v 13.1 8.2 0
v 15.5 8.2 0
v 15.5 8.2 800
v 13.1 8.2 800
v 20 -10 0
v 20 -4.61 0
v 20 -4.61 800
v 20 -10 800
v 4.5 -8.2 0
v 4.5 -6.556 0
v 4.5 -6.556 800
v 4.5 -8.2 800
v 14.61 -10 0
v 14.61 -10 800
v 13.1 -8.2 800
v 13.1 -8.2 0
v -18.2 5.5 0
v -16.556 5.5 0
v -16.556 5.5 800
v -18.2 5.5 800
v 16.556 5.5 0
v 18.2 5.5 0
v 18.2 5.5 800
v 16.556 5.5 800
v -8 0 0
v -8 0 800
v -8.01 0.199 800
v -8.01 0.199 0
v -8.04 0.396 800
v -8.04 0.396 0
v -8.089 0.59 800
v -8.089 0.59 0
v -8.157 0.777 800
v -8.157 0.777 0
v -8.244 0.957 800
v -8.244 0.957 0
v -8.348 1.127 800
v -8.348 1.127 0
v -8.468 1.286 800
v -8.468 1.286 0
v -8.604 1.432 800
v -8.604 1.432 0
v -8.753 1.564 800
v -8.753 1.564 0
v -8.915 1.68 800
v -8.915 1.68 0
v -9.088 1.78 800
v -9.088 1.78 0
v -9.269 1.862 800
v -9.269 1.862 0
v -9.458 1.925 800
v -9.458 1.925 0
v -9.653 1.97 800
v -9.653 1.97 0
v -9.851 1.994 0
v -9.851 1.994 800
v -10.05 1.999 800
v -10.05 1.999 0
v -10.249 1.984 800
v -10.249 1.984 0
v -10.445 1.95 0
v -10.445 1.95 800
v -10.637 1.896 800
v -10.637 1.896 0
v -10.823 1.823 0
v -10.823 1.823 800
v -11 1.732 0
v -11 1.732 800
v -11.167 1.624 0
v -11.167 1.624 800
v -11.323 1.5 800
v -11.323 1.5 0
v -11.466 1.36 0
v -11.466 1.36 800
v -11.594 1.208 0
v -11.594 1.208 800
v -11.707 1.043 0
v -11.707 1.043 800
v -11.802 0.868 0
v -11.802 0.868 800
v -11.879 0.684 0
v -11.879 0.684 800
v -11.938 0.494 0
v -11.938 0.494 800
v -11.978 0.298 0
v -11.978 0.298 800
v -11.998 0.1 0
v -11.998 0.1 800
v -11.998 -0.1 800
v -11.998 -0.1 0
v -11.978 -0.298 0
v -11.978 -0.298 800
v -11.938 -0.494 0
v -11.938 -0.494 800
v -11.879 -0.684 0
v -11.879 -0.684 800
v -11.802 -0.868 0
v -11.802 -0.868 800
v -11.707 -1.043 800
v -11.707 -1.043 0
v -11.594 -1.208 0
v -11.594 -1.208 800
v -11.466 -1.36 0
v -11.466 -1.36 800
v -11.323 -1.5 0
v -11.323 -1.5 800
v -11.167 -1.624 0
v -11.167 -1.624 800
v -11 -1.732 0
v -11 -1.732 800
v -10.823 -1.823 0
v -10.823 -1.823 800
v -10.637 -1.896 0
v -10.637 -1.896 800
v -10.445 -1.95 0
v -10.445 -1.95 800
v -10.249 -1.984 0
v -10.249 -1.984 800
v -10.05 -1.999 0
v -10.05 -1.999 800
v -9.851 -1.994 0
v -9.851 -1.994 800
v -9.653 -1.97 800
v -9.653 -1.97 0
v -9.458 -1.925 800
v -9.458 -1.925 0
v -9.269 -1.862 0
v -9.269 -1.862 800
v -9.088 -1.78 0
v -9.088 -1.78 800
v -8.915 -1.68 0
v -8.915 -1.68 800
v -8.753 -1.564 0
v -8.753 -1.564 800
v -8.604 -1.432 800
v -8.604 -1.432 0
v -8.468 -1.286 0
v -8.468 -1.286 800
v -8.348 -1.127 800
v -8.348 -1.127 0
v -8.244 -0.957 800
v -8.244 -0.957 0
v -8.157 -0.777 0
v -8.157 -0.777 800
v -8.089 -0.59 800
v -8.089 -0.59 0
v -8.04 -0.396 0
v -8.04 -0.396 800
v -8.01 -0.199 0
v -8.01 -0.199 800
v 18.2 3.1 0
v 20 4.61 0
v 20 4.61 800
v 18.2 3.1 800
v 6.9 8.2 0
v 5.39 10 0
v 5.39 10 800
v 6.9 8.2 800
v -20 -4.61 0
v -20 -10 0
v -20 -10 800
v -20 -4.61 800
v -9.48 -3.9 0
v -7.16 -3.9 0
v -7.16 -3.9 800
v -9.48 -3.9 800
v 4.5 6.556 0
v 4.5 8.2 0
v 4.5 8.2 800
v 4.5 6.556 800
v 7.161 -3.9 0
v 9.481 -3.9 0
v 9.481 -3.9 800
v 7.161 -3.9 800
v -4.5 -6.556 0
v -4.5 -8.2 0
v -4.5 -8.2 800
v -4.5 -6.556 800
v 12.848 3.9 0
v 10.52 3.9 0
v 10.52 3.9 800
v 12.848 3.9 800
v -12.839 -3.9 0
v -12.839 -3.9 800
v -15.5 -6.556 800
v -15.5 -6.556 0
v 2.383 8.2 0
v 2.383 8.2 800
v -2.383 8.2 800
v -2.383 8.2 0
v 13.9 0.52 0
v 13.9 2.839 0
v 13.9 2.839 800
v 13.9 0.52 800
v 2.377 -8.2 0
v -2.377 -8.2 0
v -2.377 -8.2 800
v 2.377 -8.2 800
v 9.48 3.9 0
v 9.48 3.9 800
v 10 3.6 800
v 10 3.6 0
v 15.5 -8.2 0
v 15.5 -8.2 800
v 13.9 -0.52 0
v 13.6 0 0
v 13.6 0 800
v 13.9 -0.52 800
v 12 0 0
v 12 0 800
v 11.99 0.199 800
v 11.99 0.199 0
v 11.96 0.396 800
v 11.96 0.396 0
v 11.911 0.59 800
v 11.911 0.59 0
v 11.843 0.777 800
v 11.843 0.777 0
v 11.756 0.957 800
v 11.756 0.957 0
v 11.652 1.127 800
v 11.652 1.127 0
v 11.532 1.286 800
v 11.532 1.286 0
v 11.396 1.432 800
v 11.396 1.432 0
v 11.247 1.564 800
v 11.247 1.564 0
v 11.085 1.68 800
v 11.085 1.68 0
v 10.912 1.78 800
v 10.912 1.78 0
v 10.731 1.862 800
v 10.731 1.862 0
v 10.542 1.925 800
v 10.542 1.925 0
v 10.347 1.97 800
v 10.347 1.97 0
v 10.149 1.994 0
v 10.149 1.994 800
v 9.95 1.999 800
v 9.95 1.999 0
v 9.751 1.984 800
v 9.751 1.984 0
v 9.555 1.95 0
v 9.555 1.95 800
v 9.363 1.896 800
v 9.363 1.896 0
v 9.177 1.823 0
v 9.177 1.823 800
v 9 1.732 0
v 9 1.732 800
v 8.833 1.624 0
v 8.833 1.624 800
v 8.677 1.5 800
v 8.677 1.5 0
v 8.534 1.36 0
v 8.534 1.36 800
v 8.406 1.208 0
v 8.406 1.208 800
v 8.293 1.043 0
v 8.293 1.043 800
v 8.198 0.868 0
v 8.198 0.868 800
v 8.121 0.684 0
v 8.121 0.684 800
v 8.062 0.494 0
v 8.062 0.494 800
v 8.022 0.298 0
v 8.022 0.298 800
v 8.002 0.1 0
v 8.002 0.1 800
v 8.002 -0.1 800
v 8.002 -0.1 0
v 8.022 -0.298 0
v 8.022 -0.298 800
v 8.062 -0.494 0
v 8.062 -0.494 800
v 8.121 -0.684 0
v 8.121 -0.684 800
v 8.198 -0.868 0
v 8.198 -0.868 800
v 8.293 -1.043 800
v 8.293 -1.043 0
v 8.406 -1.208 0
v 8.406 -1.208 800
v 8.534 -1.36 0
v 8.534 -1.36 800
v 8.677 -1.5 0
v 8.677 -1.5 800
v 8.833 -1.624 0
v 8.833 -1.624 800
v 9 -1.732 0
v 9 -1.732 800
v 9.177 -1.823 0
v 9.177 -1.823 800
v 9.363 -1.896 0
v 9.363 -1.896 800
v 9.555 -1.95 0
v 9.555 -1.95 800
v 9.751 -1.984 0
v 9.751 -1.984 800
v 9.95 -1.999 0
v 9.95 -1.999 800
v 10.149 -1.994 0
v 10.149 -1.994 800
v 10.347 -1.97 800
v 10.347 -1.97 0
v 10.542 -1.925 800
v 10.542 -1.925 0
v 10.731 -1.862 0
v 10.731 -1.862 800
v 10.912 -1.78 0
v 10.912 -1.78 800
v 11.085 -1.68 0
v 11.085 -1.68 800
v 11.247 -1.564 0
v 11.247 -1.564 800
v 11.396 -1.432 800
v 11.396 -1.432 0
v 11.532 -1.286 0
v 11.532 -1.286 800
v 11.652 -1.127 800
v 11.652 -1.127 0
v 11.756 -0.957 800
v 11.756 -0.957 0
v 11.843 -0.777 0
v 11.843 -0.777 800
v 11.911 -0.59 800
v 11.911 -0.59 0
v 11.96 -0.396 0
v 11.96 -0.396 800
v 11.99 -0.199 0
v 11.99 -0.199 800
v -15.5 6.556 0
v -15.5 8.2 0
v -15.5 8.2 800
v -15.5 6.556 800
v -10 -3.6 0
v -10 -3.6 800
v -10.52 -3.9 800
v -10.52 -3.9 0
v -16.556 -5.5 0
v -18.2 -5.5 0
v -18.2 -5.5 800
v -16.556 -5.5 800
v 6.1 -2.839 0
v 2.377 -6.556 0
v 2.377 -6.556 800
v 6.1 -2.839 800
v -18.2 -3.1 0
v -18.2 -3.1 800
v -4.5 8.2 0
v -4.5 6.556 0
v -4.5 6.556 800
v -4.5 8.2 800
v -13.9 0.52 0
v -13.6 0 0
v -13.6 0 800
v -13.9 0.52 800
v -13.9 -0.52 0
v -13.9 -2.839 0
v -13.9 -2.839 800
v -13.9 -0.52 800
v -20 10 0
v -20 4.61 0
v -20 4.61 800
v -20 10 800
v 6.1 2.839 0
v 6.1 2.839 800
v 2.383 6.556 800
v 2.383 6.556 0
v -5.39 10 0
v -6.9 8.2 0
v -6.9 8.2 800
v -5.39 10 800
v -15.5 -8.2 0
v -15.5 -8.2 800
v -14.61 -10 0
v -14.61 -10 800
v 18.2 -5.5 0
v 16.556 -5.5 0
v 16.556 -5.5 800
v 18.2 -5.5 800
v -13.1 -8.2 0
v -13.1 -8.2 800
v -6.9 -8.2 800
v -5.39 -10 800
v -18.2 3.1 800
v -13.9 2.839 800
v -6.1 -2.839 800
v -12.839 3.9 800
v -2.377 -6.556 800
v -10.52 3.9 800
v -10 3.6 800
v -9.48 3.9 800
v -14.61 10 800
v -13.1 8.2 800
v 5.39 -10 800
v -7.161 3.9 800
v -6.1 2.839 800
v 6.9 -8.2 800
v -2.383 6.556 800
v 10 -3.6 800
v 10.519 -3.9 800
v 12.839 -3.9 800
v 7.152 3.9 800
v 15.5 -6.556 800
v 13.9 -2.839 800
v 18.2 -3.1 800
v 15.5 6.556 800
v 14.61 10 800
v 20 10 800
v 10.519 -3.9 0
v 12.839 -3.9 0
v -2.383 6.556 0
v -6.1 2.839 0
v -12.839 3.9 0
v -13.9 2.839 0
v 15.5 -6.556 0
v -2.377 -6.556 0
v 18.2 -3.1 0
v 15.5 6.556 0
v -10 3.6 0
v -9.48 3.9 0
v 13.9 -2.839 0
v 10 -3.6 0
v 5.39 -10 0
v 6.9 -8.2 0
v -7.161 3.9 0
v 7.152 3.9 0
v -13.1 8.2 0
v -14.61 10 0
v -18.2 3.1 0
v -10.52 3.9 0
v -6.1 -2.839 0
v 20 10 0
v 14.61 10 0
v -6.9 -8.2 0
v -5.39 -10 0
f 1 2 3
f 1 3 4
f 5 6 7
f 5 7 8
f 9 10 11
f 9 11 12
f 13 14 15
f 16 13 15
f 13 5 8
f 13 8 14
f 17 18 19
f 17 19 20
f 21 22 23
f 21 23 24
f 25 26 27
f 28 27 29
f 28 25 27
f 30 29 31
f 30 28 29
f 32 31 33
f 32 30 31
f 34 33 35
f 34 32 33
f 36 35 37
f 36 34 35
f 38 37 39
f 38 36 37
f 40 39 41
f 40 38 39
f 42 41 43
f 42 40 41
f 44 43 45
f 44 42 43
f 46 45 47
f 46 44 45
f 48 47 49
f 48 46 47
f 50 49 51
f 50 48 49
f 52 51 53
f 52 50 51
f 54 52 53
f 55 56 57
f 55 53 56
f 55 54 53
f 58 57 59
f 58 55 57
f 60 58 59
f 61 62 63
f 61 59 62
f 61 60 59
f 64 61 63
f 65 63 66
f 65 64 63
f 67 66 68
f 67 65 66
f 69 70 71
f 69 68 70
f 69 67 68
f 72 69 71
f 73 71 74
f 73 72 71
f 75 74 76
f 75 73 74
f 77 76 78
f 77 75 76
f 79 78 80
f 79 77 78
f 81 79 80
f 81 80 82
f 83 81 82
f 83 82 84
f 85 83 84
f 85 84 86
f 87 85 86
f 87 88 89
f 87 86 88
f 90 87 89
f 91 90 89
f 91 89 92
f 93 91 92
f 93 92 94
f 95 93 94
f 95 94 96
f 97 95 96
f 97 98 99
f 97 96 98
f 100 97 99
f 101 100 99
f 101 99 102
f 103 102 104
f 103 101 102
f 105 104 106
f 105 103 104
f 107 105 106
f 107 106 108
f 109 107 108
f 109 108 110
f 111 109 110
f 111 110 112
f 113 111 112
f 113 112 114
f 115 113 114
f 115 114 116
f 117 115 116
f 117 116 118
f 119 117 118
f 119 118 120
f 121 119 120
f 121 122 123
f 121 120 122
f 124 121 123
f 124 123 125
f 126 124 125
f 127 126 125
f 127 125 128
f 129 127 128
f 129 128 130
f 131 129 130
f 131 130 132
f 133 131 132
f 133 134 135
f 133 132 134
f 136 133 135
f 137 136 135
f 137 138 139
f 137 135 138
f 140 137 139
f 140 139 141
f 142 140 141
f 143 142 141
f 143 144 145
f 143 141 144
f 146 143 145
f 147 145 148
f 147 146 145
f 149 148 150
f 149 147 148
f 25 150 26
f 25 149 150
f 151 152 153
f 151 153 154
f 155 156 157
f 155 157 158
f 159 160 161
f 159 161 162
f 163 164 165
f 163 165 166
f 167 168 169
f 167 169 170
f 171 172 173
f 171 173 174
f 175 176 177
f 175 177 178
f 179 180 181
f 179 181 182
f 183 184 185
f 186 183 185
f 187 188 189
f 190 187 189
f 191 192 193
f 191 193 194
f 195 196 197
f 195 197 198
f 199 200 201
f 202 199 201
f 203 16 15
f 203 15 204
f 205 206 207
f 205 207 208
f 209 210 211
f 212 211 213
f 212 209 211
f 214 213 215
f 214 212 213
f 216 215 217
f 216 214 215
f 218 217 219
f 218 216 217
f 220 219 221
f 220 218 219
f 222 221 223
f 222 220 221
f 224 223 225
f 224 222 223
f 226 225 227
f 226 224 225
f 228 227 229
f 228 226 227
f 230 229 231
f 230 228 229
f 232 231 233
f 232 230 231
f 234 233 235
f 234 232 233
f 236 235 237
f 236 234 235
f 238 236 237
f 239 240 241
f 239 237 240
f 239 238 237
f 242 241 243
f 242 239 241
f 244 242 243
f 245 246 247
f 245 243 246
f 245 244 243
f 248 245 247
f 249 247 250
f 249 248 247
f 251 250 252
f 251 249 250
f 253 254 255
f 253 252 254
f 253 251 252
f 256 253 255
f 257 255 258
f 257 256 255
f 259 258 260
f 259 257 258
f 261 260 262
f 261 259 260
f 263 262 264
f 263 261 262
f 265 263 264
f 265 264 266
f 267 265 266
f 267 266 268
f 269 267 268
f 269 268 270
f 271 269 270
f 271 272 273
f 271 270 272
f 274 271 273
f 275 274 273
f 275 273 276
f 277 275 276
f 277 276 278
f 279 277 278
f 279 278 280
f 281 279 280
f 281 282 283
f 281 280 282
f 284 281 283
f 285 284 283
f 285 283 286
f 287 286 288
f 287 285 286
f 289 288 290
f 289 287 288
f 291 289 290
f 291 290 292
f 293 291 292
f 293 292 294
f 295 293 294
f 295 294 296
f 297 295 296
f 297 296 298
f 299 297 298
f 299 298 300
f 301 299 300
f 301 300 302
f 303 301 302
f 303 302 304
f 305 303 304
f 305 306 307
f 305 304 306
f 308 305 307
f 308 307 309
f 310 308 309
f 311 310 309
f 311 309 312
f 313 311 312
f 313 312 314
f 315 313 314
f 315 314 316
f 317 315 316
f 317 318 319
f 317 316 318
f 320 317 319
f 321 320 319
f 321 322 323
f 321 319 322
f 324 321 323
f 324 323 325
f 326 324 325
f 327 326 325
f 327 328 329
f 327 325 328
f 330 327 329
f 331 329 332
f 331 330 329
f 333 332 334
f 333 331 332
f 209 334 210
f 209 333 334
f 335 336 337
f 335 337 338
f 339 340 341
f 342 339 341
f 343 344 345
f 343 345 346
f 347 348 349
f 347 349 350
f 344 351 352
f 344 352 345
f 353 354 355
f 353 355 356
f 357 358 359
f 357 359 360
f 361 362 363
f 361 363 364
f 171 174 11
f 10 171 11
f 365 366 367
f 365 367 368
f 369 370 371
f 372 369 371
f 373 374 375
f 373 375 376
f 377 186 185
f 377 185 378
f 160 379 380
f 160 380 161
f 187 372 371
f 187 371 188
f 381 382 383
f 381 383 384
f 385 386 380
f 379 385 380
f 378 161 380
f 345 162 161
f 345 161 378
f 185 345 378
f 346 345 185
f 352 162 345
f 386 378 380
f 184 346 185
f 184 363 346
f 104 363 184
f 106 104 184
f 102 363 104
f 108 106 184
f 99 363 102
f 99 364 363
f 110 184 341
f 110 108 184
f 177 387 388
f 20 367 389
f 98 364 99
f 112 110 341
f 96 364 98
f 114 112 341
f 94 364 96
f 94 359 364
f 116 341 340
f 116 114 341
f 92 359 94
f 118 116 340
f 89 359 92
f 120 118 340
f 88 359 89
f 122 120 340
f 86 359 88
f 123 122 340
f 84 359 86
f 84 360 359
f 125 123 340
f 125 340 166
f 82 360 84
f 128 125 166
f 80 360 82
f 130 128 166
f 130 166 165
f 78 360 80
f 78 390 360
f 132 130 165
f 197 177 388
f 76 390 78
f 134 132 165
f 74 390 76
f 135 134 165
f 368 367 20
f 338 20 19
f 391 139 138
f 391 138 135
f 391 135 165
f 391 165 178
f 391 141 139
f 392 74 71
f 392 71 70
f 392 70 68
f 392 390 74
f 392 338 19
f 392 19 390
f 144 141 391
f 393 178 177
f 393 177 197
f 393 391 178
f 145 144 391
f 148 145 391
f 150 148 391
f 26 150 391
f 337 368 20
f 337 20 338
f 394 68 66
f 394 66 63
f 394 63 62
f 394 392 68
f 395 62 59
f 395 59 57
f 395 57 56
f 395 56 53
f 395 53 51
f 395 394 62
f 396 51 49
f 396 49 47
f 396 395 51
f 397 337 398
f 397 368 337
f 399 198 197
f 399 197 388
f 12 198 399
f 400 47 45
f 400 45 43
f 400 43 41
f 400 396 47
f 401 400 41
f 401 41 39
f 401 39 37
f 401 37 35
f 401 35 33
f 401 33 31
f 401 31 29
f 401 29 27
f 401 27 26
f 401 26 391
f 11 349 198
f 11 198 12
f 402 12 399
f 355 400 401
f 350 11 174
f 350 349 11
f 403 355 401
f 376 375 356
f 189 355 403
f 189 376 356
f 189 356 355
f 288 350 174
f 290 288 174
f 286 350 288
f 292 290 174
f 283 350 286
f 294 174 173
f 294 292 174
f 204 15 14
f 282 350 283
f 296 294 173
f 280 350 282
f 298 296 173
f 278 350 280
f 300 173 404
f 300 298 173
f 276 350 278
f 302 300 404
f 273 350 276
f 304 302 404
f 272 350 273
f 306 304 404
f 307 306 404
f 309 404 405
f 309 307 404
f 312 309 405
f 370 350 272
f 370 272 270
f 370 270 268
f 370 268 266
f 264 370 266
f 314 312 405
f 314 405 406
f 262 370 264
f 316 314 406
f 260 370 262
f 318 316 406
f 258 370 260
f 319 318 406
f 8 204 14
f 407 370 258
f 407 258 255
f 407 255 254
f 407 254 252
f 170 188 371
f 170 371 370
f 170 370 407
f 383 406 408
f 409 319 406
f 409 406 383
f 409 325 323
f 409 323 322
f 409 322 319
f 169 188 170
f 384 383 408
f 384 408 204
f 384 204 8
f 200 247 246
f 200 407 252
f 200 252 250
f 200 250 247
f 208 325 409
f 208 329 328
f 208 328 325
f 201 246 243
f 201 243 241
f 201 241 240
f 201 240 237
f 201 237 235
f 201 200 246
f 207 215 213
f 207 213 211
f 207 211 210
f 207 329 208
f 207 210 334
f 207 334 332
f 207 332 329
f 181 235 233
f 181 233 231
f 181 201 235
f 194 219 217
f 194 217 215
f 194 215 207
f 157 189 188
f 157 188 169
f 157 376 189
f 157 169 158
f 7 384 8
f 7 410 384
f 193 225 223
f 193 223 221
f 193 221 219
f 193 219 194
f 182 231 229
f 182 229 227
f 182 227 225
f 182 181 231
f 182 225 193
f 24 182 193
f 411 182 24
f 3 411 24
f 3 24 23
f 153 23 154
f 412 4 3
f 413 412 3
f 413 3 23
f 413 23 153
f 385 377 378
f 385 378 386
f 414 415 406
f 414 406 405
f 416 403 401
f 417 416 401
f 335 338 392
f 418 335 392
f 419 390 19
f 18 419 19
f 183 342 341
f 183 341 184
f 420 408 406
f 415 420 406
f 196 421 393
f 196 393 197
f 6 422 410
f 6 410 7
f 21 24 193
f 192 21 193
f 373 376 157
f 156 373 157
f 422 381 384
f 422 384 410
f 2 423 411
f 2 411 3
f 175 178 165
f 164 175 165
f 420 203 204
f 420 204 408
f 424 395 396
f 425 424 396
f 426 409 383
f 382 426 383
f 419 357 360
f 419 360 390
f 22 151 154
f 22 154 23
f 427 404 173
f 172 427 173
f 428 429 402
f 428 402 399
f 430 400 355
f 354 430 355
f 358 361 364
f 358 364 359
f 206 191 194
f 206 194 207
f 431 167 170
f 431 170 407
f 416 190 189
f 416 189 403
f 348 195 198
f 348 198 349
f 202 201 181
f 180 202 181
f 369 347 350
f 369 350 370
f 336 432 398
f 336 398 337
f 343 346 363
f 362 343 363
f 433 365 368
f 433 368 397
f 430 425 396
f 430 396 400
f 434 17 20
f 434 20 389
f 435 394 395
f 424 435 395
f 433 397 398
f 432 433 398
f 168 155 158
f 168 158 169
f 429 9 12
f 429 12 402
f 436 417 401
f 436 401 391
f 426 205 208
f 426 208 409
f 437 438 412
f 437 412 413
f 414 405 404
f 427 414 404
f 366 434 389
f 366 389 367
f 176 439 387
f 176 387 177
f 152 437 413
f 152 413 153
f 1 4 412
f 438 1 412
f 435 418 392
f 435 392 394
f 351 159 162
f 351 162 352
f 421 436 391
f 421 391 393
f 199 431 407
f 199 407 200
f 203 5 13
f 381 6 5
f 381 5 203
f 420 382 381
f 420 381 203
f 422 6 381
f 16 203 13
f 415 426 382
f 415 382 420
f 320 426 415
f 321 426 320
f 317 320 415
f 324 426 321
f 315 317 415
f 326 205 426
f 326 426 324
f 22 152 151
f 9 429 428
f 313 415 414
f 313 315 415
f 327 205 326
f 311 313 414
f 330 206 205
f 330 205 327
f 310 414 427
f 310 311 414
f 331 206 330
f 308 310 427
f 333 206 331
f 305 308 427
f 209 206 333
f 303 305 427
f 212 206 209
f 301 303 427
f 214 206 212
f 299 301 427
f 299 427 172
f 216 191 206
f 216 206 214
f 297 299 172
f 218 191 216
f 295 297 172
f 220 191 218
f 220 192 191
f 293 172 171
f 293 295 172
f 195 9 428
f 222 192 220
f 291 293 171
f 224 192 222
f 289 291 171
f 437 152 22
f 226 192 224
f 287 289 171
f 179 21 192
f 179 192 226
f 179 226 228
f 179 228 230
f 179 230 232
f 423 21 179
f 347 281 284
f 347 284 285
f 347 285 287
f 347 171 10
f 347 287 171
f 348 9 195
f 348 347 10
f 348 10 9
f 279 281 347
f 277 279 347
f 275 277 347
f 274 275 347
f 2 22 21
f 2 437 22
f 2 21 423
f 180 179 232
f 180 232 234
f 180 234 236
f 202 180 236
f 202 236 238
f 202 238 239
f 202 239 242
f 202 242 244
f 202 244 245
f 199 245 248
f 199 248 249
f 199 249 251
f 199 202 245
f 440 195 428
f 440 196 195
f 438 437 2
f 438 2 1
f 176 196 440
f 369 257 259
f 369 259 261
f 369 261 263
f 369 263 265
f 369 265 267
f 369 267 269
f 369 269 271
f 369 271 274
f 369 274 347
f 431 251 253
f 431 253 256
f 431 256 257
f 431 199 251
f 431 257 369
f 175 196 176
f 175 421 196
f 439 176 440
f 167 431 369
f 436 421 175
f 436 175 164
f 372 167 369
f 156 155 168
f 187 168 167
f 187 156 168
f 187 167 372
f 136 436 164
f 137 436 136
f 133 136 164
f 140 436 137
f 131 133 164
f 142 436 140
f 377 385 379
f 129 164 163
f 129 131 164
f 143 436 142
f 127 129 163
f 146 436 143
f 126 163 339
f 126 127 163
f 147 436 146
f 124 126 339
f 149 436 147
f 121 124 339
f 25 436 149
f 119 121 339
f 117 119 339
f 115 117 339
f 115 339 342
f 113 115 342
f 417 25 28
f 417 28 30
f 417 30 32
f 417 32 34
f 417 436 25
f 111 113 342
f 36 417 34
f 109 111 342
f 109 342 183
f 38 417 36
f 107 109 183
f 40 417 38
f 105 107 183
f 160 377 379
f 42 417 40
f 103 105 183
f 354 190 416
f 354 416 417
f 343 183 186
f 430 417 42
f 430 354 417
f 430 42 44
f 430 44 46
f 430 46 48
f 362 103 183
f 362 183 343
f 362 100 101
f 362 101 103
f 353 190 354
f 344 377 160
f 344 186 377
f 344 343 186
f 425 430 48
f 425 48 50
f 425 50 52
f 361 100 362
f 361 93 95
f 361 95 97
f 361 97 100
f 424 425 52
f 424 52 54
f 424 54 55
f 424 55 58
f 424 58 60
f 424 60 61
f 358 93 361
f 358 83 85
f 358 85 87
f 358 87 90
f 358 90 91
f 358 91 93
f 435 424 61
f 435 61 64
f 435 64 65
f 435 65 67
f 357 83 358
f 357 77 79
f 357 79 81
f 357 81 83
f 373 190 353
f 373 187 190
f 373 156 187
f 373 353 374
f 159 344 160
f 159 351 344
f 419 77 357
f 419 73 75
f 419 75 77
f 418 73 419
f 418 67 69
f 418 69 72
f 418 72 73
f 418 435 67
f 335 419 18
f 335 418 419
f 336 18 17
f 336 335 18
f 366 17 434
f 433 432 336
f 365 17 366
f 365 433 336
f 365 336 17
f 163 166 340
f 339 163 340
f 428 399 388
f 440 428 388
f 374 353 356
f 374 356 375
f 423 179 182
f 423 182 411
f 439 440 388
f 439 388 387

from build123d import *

# Parameters (mm, degrees)
SKETCH1_R           = 2
BOSS_EXTRUDE1_DEPTH = 1000
SKETCH2_W           = 40
SKETCH2_H           = 20
CUT_EXTRUDE1_DEPTH  = 200


with BuildPart() as part:
    # Sketch1 → Boss-Extrude1 (new body)
    with BuildSketch(Plane.XY):
        Polygon((-5.389620664, 10), (5.389620664, 10), (6.9, 8.2), (4.5, 8.2), (4.5, 6.556171609), (7.151917065, 3.899773171), (9.480384758, 3.899773171), (10, 3.599773171), (10.519615242, 3.899773171), (12.848082935, 3.899773171), (15.5, 6.556171609), (15.5, 8.2), (13.1, 8.2), (14.610379336, 10), (20, 10), (20, 4.610379336), (18.2, 3.1), (18.2, 5.5), (16.556171609, 5.5), (13.9, 2.839339828), (13.9, 0.519615231), (13.599999981, 0), (13.9, -0.519615231), (13.9, -2.839339828), (16.556171609, -5.5), (18.2, -5.5), (18.2, -3.1), (20, -4.610379336), (20, -10), (14.610379336, -10), (13.1, -8.2), (15.5, -8.2), (15.5, -6.556171609), (12.839339828, -3.9), (10.519222362, -3.9), (10, -3.600226829), (9.480777638, -3.9), (7.160660172, -3.9), (4.5, -6.556171609), (4.5, -8.2), (6.9, -8.2), (5.389620664, -10), (-5.389620664, -10), (-6.9, -8.2), (-4.5, -8.2), (-4.5, -6.556171609), (-7.160432959, -3.900226829), (-9.480384758, -3.900226829), (-10, -3.600226829), (-10.519615242, -3.900226829), (-12.839339828, -3.9), (-15.5, -6.556171609), (-15.5, -8.2), (-13.1, -8.2), (-14.610379336, -10), (-20, -10), (-20, -4.610379336), (-18.2, -3.1), (-18.2, -5.5), (-16.556171609, -5.5), (-13.9, -2.839339828), (-13.9, -0.519615231), (-13.599999981, 0), (-13.9, 0.519615231), (-13.9, 2.839339828), (-16.556171609, 5.5), (-18.2, 5.5), (-18.2, 3.1), (-20, 4.610379336), (-20, 10), (-14.610379336, 10), (-13.1, 8.2), (-15.5, 8.2), (-15.5, 6.556171609), (-12.839339828, 3.9), (-10.519615242, 3.899773171), (-10, 3.599773171), (-9.480384758, 3.899773171), (-7.160660172, 3.9), (-4.5, 6.556171609), (-4.5, 8.2), (-6.9, 8.2), align=None)
        with Locations((-10, 0)):
            Circle(SKETCH1_R, mode=Mode.SUBTRACT)
        with Locations((10, 0)):
            Circle(SKETCH1_R, mode=Mode.SUBTRACT)
        Polygon((-6.1, -2.839339828), (-2.376887287, -6.556171609), (-2.376887287, -8.2), (2.376887287, -8.2), (2.376887287, -6.556171609), (6.1, -2.839339828), (6.1, 2.839339828), (2.383168219, 6.556171609), (2.383168219, 8.2), (-2.383168219, 8.2), (-2.383168219, 6.556171609), (-6.1, 2.839339828), align=None, mode=Mode.SUBTRACT)
    extrude(amount=BOSS_EXTRUDE1_DEPTH)

    # Sketch2 → Cut-Extrude1 (cut)
    with BuildSketch(Plane.XY.offset(1000)):
        Rectangle(SKETCH2_W, SKETCH2_H)
    extrude(amount=-CUT_EXTRUDE1_DEPTH, mode=Mode.SUBTRACT)


solid = part.part
